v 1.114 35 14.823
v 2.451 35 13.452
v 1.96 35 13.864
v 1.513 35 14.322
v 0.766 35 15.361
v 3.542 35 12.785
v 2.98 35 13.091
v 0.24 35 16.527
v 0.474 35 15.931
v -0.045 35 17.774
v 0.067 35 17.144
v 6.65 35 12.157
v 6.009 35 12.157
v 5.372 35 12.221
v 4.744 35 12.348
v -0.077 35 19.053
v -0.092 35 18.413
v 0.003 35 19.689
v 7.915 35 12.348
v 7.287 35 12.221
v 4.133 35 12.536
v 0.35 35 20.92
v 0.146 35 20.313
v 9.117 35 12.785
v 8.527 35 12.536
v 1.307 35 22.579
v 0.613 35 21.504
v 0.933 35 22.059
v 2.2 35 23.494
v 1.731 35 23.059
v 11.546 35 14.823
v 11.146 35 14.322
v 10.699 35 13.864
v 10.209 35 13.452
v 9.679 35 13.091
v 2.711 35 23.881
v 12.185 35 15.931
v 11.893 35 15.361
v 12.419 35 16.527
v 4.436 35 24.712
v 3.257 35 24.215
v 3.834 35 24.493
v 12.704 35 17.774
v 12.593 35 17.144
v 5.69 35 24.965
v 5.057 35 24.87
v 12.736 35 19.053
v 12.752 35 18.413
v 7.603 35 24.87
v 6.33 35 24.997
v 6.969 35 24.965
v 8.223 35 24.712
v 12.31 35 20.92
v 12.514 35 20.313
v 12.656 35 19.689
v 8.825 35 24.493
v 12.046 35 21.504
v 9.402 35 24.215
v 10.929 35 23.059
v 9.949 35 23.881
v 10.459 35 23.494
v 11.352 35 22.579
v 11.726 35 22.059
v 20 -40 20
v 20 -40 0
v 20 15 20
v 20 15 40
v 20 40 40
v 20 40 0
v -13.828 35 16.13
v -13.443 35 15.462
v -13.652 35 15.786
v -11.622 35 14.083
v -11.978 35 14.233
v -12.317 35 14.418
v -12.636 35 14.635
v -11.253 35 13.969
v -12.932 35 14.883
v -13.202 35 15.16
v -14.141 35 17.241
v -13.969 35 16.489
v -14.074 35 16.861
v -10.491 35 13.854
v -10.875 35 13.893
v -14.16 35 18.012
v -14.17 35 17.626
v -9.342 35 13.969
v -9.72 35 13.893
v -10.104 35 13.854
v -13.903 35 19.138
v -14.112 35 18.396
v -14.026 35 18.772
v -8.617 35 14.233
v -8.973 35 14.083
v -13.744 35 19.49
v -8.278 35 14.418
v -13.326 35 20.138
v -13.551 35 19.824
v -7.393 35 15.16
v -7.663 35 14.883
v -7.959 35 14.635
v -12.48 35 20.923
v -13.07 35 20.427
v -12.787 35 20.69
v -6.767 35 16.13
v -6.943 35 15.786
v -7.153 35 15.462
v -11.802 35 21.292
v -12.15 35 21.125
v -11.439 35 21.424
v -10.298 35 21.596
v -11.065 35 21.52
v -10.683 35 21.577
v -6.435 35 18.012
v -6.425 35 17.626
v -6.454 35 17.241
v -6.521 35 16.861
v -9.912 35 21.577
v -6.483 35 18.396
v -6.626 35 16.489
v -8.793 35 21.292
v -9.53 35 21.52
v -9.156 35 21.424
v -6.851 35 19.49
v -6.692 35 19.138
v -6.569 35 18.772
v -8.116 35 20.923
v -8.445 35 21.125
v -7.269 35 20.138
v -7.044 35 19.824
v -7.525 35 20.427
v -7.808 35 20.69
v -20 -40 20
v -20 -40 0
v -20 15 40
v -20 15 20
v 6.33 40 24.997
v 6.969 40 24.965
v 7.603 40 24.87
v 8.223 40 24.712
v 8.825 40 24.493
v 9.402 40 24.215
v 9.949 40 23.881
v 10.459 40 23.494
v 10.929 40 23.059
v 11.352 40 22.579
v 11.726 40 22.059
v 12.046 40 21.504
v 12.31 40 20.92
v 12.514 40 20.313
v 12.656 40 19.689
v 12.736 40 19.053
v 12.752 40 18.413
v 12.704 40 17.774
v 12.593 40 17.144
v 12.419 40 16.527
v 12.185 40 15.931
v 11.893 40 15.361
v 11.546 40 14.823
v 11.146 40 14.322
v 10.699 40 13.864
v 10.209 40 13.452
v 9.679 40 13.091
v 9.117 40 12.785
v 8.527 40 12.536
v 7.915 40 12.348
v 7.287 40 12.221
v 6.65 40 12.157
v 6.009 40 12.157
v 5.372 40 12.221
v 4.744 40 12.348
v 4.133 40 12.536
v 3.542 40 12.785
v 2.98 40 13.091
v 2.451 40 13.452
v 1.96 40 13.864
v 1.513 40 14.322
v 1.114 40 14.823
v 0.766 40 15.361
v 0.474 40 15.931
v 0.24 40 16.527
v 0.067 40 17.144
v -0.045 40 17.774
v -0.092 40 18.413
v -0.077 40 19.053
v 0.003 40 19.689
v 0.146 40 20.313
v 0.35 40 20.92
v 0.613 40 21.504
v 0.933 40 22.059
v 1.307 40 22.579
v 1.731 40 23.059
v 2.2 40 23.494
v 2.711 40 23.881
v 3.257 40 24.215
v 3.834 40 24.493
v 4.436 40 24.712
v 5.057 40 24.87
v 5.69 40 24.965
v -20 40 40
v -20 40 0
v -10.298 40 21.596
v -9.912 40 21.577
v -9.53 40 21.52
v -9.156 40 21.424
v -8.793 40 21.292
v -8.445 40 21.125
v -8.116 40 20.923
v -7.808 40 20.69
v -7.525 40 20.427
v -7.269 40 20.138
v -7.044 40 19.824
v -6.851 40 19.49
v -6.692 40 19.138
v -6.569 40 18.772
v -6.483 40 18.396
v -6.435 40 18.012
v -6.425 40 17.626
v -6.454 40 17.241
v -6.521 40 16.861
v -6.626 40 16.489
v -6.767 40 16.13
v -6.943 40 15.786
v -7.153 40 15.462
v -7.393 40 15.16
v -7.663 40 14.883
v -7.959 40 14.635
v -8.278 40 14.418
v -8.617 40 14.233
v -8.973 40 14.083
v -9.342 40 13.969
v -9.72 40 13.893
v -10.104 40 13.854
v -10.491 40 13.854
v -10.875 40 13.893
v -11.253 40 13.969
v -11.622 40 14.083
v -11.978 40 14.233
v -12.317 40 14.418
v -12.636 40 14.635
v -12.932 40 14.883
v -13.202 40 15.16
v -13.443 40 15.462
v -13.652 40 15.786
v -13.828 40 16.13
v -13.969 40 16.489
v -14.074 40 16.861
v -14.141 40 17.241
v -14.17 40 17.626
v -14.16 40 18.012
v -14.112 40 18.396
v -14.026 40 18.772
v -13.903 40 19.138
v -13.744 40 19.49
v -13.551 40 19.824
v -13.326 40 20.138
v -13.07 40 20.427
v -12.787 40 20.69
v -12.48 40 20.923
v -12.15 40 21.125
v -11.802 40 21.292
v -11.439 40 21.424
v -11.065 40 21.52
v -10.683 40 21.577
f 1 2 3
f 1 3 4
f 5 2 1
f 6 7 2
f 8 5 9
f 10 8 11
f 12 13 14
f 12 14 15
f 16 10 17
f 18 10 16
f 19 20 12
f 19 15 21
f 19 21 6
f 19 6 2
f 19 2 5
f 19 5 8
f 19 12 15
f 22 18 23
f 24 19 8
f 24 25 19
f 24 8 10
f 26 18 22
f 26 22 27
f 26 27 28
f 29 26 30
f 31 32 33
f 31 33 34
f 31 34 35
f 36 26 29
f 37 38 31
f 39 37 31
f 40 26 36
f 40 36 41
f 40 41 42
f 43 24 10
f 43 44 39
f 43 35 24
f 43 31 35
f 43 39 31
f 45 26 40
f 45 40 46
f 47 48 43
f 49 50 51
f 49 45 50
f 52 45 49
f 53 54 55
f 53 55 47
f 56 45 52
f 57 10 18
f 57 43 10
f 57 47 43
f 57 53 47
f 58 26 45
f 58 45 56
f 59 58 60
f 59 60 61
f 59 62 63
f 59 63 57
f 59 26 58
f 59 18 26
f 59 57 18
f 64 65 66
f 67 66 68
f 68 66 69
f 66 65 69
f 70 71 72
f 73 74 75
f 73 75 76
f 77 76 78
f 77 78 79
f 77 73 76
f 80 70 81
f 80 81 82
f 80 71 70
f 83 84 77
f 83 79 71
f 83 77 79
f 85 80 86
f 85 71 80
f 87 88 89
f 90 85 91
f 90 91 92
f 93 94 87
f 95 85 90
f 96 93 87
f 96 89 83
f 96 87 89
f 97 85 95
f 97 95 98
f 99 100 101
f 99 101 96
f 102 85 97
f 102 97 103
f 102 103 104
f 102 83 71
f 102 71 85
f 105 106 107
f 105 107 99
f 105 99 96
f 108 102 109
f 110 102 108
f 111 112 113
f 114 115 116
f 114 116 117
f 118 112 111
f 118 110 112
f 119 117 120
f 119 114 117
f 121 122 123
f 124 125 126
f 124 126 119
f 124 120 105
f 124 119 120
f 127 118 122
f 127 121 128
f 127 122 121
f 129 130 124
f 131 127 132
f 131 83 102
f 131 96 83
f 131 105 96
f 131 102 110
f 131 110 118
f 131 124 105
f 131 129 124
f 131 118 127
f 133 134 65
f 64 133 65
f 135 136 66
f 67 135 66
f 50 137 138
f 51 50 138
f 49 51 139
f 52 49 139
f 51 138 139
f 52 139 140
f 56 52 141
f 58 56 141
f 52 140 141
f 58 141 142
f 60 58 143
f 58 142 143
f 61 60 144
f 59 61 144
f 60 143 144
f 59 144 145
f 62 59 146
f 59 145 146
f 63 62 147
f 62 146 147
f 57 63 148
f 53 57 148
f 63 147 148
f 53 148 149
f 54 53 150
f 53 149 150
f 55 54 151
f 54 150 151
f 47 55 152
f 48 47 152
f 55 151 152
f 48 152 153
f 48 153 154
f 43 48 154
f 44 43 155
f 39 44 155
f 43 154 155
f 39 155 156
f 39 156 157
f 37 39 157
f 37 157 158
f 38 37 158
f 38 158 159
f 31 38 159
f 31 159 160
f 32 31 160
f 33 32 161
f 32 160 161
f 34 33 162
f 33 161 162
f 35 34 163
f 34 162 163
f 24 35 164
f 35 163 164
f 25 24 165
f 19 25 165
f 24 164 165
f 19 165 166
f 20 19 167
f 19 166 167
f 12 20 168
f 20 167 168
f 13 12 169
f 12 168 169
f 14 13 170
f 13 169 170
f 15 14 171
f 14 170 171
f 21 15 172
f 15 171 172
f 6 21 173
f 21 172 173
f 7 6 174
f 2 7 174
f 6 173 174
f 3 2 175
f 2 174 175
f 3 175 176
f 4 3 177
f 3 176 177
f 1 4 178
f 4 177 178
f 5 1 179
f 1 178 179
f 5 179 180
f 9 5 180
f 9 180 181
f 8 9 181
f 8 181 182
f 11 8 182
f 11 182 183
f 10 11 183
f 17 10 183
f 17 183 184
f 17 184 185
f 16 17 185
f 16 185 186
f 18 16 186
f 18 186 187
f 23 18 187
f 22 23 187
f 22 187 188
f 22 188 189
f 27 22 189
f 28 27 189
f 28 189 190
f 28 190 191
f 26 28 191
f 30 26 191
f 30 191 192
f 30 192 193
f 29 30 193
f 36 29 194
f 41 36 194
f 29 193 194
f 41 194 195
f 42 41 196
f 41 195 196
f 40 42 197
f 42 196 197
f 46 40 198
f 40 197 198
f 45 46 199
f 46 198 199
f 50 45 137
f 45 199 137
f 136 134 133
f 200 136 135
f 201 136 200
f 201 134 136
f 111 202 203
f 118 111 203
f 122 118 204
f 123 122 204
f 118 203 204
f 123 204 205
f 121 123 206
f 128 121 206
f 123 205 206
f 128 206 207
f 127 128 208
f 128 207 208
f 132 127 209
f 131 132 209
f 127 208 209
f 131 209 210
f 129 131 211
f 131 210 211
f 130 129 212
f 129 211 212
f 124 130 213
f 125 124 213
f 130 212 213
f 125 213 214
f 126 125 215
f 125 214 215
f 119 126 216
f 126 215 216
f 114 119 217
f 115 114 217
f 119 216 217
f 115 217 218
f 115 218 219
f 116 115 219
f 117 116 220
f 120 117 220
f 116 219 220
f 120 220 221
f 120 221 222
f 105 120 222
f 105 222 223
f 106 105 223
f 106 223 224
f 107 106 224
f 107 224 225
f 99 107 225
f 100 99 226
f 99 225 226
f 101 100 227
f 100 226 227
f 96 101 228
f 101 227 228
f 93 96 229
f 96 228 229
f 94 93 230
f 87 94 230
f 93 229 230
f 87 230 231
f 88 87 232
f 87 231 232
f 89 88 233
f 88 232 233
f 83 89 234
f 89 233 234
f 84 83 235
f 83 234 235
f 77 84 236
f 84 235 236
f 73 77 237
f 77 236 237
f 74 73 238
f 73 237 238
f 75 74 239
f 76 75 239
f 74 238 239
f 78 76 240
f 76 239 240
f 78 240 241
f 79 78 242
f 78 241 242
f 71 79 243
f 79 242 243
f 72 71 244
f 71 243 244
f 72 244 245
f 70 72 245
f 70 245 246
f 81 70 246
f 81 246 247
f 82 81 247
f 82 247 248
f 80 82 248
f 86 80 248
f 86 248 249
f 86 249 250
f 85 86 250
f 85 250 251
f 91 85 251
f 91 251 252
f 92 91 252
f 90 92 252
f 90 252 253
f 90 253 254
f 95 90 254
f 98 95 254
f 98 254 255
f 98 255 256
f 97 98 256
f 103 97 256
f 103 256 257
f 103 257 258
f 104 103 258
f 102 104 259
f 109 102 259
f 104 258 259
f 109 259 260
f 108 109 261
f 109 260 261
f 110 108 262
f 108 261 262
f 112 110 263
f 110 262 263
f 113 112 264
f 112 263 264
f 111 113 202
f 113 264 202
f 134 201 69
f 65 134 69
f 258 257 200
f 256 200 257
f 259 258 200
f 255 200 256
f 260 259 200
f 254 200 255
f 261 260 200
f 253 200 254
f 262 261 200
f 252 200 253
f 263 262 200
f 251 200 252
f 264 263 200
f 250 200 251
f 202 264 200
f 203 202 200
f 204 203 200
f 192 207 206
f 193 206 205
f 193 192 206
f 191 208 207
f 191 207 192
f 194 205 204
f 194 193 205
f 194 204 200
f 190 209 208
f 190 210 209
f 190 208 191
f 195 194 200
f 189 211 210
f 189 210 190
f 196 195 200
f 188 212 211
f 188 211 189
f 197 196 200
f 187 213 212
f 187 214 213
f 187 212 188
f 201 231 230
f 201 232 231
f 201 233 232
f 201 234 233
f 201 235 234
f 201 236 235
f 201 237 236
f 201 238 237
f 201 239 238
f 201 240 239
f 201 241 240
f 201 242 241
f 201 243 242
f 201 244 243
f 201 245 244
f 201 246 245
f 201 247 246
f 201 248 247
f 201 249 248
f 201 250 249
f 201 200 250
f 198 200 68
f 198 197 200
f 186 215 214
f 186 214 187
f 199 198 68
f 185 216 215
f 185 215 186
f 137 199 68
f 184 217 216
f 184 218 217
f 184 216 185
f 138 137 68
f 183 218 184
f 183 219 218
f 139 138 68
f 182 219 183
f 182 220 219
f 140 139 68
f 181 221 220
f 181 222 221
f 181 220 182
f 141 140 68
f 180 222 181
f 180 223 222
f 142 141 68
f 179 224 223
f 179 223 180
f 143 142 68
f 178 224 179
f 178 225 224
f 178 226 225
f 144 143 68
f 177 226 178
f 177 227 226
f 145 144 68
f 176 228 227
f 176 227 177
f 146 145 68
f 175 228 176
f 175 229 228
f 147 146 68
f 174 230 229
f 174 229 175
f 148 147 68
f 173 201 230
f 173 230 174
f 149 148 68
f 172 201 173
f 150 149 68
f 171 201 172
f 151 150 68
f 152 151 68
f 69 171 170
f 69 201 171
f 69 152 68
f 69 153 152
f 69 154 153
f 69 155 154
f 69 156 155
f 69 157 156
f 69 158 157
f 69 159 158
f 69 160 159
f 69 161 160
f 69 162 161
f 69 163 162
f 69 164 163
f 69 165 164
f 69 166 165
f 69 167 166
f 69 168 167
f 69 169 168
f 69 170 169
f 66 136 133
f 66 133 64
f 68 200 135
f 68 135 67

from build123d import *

# Parameters (mm, degrees)
SKETCH_1_W          = 40
SKETCH_1_H          = 80
EXTRUDE_1_DEPTH     = 20
SKETCH_2_W          = 40
SKETCH_2_H          = 25
EXTRUDE_2_DEPTH     = 20
SKETCH_3_R          = 3.87339884
SKETCH_3_R_2        = 6.424173687
CUT_EXTRUDE_1_DEPTH = 5


with BuildPart() as part:
    # 草图1 → 凸台-拉伸1 (new body)
    with BuildSketch(Plane.XY):
        Rectangle(SKETCH_1_W, SKETCH_1_H)
    extrude(amount=EXTRUDE_1_DEPTH)

    # 草图2 → 凸台-拉伸2 (add)
    with BuildSketch(Plane.XY.offset(20)):
        with Locations((0, 27.5)):
            Rectangle(SKETCH_2_W, SKETCH_2_H)
    extrude(amount=EXTRUDE_2_DEPTH)

    # 草图3 → 切除-拉伸1 (cut)
    with BuildSketch(Plane(origin=(0, 40, 0), x_dir=(1, 0, 0), z_dir=(0, 1, 0))):
        with Locations(Location((-10.297572527, -17.722901183, 0), (0, 0, 270))):
            Circle(SKETCH_3_R)
        with Locations(Location((6.329700544, -18.573159465, 0), (0, 0, 270))):
            Circle(SKETCH_3_R_2)
    extrude(amount=-CUT_EXTRUDE_1_DEPTH, mode=Mode.SUBTRACT)


solid = part.part
